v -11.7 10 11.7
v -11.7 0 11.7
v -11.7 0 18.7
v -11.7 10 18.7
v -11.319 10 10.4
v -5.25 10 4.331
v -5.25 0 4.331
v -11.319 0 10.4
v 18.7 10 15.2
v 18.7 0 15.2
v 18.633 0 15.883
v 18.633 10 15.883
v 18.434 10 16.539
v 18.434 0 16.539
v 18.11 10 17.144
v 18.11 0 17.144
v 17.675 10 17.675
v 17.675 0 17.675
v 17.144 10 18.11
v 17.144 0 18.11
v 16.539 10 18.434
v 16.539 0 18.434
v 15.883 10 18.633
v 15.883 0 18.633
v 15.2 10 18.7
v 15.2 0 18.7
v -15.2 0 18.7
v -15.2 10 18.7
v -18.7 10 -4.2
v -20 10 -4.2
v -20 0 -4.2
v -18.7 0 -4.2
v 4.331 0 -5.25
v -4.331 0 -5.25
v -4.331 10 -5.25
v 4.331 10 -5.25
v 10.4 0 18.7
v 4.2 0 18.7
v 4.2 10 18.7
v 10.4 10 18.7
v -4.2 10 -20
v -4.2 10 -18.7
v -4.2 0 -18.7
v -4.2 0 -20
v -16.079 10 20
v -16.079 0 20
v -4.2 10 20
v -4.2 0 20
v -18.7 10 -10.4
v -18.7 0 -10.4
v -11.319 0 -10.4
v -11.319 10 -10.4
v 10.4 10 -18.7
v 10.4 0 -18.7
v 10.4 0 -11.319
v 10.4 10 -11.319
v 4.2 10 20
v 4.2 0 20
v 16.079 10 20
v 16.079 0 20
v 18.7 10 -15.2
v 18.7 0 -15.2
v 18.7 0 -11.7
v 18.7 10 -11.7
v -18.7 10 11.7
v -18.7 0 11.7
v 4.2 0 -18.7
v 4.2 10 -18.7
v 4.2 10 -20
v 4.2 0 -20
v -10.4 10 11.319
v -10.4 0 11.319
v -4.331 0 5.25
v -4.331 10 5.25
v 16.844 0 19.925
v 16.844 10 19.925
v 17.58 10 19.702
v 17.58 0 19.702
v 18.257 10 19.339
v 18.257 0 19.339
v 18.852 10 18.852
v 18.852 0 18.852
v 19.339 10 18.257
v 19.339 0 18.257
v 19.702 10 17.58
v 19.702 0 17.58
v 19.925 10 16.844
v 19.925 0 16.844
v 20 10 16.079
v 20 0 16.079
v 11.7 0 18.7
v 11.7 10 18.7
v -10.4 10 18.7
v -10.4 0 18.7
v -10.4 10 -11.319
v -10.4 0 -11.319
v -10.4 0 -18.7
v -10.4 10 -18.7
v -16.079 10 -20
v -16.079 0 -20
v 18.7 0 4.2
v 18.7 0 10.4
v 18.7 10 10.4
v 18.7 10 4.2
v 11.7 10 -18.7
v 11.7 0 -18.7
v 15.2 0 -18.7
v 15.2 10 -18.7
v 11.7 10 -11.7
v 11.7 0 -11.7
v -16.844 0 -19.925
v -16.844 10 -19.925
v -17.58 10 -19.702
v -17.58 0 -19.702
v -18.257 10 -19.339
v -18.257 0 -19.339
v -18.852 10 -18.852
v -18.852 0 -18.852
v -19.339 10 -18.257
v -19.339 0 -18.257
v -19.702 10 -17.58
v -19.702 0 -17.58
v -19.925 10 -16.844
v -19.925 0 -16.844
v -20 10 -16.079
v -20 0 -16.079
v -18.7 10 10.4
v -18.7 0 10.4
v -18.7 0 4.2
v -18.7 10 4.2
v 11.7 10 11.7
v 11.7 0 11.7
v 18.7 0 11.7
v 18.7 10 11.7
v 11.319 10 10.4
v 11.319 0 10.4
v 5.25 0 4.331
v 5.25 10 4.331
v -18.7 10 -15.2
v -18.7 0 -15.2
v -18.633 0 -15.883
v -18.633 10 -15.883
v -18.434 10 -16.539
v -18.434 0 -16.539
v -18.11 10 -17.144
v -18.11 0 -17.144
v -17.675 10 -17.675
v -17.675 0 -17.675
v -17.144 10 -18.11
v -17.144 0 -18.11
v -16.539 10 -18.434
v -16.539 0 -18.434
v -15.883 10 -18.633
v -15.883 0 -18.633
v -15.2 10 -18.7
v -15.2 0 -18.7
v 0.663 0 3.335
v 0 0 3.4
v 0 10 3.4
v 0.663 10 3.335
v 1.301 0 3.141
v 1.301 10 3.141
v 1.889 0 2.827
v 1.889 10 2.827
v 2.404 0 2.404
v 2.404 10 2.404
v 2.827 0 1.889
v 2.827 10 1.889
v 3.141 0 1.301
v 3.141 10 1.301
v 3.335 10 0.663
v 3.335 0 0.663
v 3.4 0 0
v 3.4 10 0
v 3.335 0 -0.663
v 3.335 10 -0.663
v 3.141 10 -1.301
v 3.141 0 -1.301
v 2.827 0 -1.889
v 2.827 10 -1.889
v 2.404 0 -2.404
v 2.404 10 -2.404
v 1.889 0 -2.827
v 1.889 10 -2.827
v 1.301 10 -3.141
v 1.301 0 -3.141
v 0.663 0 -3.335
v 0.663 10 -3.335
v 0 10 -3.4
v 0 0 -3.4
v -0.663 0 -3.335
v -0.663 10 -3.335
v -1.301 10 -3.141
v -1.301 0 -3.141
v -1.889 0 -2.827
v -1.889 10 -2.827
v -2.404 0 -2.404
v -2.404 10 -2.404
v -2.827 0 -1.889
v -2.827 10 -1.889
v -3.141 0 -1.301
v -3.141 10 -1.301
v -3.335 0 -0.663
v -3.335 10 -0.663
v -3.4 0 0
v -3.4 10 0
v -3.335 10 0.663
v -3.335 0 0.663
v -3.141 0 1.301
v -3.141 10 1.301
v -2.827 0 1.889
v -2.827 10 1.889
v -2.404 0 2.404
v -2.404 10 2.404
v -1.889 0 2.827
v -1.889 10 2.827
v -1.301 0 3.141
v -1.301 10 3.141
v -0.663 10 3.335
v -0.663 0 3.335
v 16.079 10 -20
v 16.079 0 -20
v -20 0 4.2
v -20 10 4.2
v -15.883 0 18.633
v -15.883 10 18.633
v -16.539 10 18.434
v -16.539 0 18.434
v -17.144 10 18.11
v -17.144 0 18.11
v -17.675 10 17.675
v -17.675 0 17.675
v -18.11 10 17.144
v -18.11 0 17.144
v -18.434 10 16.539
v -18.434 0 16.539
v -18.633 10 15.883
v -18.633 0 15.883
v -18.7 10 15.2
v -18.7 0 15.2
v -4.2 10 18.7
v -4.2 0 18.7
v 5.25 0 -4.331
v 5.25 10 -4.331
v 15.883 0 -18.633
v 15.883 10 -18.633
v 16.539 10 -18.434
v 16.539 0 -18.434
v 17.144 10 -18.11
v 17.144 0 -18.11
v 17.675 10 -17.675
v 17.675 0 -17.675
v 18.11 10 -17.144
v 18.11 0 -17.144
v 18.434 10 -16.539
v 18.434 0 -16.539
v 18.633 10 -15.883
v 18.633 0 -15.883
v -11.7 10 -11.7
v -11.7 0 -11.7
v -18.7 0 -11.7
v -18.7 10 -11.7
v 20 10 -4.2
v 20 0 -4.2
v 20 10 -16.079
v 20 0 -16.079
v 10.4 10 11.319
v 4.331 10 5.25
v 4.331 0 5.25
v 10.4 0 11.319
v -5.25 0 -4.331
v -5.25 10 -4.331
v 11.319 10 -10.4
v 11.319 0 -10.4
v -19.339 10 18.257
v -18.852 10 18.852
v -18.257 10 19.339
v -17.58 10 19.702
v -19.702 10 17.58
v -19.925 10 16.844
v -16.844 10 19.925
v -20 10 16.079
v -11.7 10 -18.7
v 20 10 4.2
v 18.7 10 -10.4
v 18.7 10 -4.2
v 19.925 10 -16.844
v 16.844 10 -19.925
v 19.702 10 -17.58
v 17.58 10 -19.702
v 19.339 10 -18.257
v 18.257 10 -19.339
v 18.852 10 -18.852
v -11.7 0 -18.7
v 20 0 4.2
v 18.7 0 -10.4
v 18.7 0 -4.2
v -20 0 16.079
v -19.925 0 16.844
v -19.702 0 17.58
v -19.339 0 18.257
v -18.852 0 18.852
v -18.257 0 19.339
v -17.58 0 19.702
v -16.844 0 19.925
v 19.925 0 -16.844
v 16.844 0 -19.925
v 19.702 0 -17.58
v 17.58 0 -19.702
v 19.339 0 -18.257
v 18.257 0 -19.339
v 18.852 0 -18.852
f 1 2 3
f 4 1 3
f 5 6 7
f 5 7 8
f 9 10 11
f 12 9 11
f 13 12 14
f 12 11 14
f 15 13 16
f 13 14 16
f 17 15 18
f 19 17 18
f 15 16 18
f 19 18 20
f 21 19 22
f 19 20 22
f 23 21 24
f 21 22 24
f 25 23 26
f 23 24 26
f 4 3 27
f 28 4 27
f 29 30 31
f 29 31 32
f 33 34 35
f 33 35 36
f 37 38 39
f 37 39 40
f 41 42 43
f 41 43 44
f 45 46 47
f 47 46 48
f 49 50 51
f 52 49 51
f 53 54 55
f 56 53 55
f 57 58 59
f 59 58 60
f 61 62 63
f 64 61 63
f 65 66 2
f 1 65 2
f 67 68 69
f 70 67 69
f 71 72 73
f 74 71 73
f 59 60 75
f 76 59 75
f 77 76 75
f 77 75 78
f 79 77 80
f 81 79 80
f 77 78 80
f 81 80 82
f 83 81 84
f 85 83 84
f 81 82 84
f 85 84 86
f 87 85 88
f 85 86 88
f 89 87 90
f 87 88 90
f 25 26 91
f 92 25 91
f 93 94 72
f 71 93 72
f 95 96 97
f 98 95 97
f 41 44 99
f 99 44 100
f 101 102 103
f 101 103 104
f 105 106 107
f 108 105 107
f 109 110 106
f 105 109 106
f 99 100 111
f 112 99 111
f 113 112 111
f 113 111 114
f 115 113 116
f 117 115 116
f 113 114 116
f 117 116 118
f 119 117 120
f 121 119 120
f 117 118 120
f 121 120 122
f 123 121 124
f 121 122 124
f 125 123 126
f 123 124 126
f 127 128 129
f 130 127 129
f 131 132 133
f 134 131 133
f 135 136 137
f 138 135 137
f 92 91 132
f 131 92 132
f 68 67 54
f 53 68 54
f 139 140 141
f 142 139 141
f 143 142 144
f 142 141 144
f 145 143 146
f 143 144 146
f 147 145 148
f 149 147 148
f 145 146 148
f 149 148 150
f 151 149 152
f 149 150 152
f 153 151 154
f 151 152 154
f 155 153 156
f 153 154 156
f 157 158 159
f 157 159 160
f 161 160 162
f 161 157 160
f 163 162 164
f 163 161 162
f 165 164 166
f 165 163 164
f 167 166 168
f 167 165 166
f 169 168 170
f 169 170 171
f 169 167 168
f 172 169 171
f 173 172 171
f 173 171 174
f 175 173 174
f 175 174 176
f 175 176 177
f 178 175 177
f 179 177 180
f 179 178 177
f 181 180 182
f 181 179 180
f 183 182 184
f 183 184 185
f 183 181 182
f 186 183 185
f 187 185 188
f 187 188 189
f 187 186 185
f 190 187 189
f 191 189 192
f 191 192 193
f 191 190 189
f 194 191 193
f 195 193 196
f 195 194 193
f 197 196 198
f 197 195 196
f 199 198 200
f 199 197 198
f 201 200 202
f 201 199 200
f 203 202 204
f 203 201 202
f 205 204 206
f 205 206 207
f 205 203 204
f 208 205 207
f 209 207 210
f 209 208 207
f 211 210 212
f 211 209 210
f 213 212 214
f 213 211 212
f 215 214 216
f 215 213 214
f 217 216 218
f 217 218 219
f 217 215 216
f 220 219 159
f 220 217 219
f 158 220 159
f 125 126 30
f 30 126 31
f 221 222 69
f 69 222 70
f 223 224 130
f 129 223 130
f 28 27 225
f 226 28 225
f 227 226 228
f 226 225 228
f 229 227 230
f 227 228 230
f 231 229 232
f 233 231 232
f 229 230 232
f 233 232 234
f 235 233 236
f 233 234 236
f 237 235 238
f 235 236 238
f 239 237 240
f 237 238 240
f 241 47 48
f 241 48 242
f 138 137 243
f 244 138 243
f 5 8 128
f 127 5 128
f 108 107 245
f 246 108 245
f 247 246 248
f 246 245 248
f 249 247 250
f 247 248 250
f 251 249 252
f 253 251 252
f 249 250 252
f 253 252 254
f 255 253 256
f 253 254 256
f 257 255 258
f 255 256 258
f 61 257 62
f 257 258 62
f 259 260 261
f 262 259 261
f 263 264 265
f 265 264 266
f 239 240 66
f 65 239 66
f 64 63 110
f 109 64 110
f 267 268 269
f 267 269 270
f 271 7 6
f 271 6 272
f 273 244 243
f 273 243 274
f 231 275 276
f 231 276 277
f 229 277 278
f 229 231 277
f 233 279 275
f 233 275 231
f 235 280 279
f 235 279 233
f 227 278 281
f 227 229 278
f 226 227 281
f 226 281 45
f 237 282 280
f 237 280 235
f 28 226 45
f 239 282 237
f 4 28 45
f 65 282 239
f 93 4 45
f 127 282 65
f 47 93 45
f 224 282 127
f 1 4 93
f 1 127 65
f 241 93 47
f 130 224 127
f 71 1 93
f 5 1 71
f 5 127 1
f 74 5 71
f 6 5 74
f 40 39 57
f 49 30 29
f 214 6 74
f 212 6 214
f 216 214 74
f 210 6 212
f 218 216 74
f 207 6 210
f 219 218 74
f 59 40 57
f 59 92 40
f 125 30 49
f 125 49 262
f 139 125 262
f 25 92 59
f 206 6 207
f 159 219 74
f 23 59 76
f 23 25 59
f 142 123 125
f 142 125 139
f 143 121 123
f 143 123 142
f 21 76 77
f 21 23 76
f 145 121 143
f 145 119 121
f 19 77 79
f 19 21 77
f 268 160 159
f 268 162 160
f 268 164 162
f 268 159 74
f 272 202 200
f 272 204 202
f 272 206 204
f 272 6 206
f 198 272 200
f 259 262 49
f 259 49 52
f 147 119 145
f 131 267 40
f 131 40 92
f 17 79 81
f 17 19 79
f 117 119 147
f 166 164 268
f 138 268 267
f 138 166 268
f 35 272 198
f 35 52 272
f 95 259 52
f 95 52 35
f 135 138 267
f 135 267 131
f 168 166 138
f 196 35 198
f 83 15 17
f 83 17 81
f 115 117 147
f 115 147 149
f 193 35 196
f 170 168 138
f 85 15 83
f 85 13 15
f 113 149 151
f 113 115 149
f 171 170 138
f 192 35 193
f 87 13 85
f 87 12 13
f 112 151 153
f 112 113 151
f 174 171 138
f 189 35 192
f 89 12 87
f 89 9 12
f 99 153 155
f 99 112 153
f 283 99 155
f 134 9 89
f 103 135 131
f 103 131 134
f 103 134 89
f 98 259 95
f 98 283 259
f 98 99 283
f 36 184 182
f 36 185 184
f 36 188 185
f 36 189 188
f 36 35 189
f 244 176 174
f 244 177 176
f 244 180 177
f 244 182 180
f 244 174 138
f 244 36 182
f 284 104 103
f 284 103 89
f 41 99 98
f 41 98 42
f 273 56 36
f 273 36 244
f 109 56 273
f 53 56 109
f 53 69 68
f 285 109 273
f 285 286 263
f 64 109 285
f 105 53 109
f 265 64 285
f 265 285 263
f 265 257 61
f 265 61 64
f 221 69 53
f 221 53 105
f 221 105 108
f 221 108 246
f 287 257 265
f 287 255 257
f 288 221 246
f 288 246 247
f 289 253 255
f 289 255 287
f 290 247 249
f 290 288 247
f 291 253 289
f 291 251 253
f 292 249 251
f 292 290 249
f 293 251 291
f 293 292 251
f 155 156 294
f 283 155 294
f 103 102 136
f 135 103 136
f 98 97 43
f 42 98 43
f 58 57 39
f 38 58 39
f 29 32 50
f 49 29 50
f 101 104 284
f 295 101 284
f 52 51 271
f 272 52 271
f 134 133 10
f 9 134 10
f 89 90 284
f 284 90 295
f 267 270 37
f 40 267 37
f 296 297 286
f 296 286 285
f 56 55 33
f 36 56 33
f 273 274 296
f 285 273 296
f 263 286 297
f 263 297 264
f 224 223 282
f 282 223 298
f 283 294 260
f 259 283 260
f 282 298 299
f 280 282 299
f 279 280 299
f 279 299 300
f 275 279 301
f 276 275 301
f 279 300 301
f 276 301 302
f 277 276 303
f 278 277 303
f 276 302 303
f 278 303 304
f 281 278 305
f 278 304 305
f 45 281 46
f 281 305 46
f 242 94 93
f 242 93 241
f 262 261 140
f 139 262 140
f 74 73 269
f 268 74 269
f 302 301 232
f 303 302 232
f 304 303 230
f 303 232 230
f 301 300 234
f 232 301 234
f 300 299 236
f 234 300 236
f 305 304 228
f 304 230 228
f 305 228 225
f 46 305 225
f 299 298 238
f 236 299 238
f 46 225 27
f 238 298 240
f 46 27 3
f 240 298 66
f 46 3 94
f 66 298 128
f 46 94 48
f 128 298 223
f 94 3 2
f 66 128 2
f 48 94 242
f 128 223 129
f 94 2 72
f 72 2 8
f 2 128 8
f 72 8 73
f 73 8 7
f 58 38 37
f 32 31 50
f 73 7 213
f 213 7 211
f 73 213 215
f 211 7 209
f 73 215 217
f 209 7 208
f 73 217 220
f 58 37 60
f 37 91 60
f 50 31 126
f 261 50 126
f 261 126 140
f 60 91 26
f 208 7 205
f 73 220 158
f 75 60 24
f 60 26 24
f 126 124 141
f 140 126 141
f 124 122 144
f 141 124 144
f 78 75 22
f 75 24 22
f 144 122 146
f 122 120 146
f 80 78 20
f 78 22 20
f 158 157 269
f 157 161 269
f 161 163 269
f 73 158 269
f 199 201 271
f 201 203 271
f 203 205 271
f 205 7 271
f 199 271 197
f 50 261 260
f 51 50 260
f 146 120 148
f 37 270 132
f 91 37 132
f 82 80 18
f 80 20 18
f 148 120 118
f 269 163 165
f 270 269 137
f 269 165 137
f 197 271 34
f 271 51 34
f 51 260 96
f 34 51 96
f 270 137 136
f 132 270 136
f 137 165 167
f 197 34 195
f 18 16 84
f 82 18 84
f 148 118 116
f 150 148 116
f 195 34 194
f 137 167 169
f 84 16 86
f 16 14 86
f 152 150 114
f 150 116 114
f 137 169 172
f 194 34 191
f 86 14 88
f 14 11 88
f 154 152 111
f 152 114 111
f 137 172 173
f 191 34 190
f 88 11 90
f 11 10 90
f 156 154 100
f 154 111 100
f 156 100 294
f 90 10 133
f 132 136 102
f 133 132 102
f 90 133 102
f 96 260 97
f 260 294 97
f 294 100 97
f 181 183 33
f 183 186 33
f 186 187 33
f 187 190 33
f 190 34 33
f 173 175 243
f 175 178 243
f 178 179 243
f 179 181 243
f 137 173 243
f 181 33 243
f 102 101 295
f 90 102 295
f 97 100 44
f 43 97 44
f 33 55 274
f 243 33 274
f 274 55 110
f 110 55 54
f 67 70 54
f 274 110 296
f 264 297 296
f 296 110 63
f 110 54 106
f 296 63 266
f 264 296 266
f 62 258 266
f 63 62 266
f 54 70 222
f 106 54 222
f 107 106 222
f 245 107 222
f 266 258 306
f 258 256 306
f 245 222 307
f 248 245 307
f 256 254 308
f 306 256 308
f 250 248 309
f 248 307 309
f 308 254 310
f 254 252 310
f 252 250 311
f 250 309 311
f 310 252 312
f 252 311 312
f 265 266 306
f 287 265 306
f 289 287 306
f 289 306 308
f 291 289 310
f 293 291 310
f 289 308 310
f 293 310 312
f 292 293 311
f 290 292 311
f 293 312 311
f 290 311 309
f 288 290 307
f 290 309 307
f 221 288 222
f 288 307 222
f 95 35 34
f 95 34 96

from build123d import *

# Parameters (mm, degrees)
SKETCH_1_W      = 6.2
SKETCH_1_H      = 1.3
SKETCH_1_W_2    = 1.3
SKETCH_1_H_2    = 6.2
SKETCH_1_W_3    = 10.5
SKETCH_1_H_3    = 10.5
SKETCH_1_R      = 3.4
EXTRUDE_2_DEPTH = 10


with BuildPart() as part:
    # 草图1 → 凸台-拉伸2 (new body)
    with BuildSketch(Plane(origin=(0, 0, 0), x_dir=(1, 0, 0), z_dir=(0, 1, 0))):
        with Locations((-7.3, -19.35)):
            Rectangle(SKETCH_1_W, SKETCH_1_H)
        with BuildLine():
            Line((-18.7, -10.4), (-20, -10.4))
            Line((-20, -10.4), (-20, -16.079155302))
            ThreePointArc((-20, -16.079155302), (-18.851611176, -18.851611176), (-16.079155302, -20))
            Line((-16.079155302, -20), (-10.4, -20))
            Line((-10.4, -20), (-10.4, -18.7))
            Line((-10.4, -18.7), (-10.4, -11.319238816))
            Line((-10.4, -11.319238816), (-10.4, -10.4))
            Line((-10.4, -10.4), (-11.319238816, -10.4))
            Line((-11.319238816, -10.4), (-18.7, -10.4))
        make_face()
        Polygon((-18.7, -15.2), (-18.7, -11.7), (-15.2, -11.7), (-11.7, -11.7), (-11.7, -15.2), (-11.7, -18.7), (-15.2, -18.7), (-18.7, -18.7), align=None, mode=Mode.SUBTRACT)
        with Locations((-19.35, -7.3)):
            Rectangle(SKETCH_1_W_2, SKETCH_1_H_2)
        with BuildLine():
            ThreePointArc((-15.2, -18.7), (-17.674873734, -17.674873734), (-18.7, -15.2))
            Line((-18.7, -15.2), (-18.7, -18.7))
            Line((-18.7, -18.7), (-15.2, -18.7))
        make_face()
        Polygon((-5.25, -5.25), (-5.25, -4.330761184), (-11.319238816, -10.4), (-10.4, -10.4), (-10.4, -11.319238816), (-4.330761184, -5.25), align=None)
        Rectangle(SKETCH_1_W_3, SKETCH_1_H_3)
        with Locations(Location((0, 0, 0), (0, 0, 270))):
            Circle(SKETCH_1_R, mode=Mode.SUBTRACT)
        Polygon((11.319238816, -10.4), (5.25, -4.330761184), (5.25, -5.25), (4.330761184, -5.25), (10.4, -11.319238816), (10.4, -10.4), align=None)
        Polygon((10.4, 11.319238816), (4.330761184, 5.25), (5.25, 5.25), (5.25, 4.330761184), (11.319238816, 10.4), (10.4, 10.4), align=None)
        Polygon((-4.330761184, 5.25), (-10.4, 11.319238816), (-10.4, 10.4), (-11.319238816, 10.4), (-5.25, 4.330761184), (-5.25, 5.25), align=None)
        with BuildLine():
            Line((18.7, -10.4), (11.319238816, -10.4))
            Line((11.319238816, -10.4), (10.4, -10.4))
            Line((10.4, -10.4), (10.4, -11.319238816))
            Line((10.4, -11.319238816), (10.4, -18.7))
            Line((10.4, -18.7), (10.4, -20))
            Line((10.4, -20), (16.079155302, -20))
            ThreePointArc((16.079155302, -20), (18.851611176, -18.851611176), (20, -16.079155302))
            Line((20, -16.079155302), (20, -10.4))
            Line((20, -10.4), (18.7, -10.4))
        make_face()
        Polygon((15.2, -11.7), (18.7, -11.7), (18.7, -15.2), (18.7, -18.7), (15.2, -18.7), (11.7, -18.7), (11.7, -15.2), (11.7, -11.7), align=None, mode=Mode.SUBTRACT)
        with BuildLine():
            Line((18.7, -18.7), (18.7, -15.2))
            ThreePointArc((18.7, -15.2), (17.674873734, -17.674873734), (15.2, -18.7))
            Line((15.2, -18.7), (18.7, -18.7))
        make_face()
        with BuildLine():
            Line((16.079155302, 20), (10.4, 20))
            Line((10.4, 20), (10.4, 18.7))
            Line((10.4, 18.7), (10.4, 11.319238816))
            Line((10.4, 11.319238816), (10.4, 10.4))
            Line((10.4, 10.4), (11.319238816, 10.4))
            Line((11.319238816, 10.4), (18.7, 10.4))
            Line((18.7, 10.4), (20, 10.4))
            Line((20, 10.4), (20, 16.079155302))
            ThreePointArc((20, 16.079155302), (18.851611176, 18.851611176), (16.079155302, 20))
        make_face()
        Polygon((15.2, 18.7), (18.7, 18.7), (18.7, 15.2), (18.7, 11.7), (15.2, 11.7), (11.7, 11.7), (11.7, 15.2), (11.7, 18.7), align=None, mode=Mode.SUBTRACT)
        with BuildLine():
            Line((18.7, 15.2), (18.7, 18.7))
            Line((18.7, 18.7), (15.2, 18.7))
            ThreePointArc((15.2, 18.7), (17.674873734, 17.674873734), (18.7, 15.2))
        make_face()
        with BuildLine():
            Line((-10.4, 20), (-16.079155302, 20))
            ThreePointArc((-16.079155302, 20), (-18.851611176, 18.851611176), (-20, 16.079155302))
            Line((-20, 16.079155302), (-20, 10.4))
            Line((-20, 10.4), (-18.7, 10.4))
            Line((-18.7, 10.4), (-11.319238816, 10.4))
            Line((-11.319238816, 10.4), (-10.4, 10.4))
            Line((-10.4, 10.4), (-10.4, 11.319238816))
            Line((-10.4, 11.319238816), (-10.4, 18.7))
            Line((-10.4, 18.7), (-10.4, 20))
        make_face()
        Polygon((-15.2, 11.7), (-18.7, 11.7), (-18.7, 15.2), (-18.7, 18.7), (-15.2, 18.7), (-11.7, 18.7), (-11.7, 15.2), (-11.7, 11.7), align=None, mode=Mode.SUBTRACT)
        with BuildLine():
            Line((-18.7, 18.7), (-18.7, 15.2))
            ThreePointArc((-18.7, 15.2), (-17.674873734, 17.674873734), (-15.2, 18.7))
            Line((-15.2, 18.7), (-18.7, 18.7))
        make_face()
        with Locations((-7.3, 19.35)):
            Rectangle(SKETCH_1_W, SKETCH_1_H)
        with Locations((7.3, 19.35)):
            Rectangle(SKETCH_1_W, SKETCH_1_H)
        with Locations((19.35, 7.3)):
            Rectangle(SKETCH_1_W_2, SKETCH_1_H_2)
        with Locations((-19.35, 7.3)):
            Rectangle(SKETCH_1_W_2, SKETCH_1_H_2)
        with Locations((19.35, -7.3)):
            Rectangle(SKETCH_1_W_2, SKETCH_1_H_2)
        with Locations((7.3, -19.35)):
            Rectangle(SKETCH_1_W, SKETCH_1_H)
    extrude(amount=EXTRUDE_2_DEPTH)


solid = part.part
